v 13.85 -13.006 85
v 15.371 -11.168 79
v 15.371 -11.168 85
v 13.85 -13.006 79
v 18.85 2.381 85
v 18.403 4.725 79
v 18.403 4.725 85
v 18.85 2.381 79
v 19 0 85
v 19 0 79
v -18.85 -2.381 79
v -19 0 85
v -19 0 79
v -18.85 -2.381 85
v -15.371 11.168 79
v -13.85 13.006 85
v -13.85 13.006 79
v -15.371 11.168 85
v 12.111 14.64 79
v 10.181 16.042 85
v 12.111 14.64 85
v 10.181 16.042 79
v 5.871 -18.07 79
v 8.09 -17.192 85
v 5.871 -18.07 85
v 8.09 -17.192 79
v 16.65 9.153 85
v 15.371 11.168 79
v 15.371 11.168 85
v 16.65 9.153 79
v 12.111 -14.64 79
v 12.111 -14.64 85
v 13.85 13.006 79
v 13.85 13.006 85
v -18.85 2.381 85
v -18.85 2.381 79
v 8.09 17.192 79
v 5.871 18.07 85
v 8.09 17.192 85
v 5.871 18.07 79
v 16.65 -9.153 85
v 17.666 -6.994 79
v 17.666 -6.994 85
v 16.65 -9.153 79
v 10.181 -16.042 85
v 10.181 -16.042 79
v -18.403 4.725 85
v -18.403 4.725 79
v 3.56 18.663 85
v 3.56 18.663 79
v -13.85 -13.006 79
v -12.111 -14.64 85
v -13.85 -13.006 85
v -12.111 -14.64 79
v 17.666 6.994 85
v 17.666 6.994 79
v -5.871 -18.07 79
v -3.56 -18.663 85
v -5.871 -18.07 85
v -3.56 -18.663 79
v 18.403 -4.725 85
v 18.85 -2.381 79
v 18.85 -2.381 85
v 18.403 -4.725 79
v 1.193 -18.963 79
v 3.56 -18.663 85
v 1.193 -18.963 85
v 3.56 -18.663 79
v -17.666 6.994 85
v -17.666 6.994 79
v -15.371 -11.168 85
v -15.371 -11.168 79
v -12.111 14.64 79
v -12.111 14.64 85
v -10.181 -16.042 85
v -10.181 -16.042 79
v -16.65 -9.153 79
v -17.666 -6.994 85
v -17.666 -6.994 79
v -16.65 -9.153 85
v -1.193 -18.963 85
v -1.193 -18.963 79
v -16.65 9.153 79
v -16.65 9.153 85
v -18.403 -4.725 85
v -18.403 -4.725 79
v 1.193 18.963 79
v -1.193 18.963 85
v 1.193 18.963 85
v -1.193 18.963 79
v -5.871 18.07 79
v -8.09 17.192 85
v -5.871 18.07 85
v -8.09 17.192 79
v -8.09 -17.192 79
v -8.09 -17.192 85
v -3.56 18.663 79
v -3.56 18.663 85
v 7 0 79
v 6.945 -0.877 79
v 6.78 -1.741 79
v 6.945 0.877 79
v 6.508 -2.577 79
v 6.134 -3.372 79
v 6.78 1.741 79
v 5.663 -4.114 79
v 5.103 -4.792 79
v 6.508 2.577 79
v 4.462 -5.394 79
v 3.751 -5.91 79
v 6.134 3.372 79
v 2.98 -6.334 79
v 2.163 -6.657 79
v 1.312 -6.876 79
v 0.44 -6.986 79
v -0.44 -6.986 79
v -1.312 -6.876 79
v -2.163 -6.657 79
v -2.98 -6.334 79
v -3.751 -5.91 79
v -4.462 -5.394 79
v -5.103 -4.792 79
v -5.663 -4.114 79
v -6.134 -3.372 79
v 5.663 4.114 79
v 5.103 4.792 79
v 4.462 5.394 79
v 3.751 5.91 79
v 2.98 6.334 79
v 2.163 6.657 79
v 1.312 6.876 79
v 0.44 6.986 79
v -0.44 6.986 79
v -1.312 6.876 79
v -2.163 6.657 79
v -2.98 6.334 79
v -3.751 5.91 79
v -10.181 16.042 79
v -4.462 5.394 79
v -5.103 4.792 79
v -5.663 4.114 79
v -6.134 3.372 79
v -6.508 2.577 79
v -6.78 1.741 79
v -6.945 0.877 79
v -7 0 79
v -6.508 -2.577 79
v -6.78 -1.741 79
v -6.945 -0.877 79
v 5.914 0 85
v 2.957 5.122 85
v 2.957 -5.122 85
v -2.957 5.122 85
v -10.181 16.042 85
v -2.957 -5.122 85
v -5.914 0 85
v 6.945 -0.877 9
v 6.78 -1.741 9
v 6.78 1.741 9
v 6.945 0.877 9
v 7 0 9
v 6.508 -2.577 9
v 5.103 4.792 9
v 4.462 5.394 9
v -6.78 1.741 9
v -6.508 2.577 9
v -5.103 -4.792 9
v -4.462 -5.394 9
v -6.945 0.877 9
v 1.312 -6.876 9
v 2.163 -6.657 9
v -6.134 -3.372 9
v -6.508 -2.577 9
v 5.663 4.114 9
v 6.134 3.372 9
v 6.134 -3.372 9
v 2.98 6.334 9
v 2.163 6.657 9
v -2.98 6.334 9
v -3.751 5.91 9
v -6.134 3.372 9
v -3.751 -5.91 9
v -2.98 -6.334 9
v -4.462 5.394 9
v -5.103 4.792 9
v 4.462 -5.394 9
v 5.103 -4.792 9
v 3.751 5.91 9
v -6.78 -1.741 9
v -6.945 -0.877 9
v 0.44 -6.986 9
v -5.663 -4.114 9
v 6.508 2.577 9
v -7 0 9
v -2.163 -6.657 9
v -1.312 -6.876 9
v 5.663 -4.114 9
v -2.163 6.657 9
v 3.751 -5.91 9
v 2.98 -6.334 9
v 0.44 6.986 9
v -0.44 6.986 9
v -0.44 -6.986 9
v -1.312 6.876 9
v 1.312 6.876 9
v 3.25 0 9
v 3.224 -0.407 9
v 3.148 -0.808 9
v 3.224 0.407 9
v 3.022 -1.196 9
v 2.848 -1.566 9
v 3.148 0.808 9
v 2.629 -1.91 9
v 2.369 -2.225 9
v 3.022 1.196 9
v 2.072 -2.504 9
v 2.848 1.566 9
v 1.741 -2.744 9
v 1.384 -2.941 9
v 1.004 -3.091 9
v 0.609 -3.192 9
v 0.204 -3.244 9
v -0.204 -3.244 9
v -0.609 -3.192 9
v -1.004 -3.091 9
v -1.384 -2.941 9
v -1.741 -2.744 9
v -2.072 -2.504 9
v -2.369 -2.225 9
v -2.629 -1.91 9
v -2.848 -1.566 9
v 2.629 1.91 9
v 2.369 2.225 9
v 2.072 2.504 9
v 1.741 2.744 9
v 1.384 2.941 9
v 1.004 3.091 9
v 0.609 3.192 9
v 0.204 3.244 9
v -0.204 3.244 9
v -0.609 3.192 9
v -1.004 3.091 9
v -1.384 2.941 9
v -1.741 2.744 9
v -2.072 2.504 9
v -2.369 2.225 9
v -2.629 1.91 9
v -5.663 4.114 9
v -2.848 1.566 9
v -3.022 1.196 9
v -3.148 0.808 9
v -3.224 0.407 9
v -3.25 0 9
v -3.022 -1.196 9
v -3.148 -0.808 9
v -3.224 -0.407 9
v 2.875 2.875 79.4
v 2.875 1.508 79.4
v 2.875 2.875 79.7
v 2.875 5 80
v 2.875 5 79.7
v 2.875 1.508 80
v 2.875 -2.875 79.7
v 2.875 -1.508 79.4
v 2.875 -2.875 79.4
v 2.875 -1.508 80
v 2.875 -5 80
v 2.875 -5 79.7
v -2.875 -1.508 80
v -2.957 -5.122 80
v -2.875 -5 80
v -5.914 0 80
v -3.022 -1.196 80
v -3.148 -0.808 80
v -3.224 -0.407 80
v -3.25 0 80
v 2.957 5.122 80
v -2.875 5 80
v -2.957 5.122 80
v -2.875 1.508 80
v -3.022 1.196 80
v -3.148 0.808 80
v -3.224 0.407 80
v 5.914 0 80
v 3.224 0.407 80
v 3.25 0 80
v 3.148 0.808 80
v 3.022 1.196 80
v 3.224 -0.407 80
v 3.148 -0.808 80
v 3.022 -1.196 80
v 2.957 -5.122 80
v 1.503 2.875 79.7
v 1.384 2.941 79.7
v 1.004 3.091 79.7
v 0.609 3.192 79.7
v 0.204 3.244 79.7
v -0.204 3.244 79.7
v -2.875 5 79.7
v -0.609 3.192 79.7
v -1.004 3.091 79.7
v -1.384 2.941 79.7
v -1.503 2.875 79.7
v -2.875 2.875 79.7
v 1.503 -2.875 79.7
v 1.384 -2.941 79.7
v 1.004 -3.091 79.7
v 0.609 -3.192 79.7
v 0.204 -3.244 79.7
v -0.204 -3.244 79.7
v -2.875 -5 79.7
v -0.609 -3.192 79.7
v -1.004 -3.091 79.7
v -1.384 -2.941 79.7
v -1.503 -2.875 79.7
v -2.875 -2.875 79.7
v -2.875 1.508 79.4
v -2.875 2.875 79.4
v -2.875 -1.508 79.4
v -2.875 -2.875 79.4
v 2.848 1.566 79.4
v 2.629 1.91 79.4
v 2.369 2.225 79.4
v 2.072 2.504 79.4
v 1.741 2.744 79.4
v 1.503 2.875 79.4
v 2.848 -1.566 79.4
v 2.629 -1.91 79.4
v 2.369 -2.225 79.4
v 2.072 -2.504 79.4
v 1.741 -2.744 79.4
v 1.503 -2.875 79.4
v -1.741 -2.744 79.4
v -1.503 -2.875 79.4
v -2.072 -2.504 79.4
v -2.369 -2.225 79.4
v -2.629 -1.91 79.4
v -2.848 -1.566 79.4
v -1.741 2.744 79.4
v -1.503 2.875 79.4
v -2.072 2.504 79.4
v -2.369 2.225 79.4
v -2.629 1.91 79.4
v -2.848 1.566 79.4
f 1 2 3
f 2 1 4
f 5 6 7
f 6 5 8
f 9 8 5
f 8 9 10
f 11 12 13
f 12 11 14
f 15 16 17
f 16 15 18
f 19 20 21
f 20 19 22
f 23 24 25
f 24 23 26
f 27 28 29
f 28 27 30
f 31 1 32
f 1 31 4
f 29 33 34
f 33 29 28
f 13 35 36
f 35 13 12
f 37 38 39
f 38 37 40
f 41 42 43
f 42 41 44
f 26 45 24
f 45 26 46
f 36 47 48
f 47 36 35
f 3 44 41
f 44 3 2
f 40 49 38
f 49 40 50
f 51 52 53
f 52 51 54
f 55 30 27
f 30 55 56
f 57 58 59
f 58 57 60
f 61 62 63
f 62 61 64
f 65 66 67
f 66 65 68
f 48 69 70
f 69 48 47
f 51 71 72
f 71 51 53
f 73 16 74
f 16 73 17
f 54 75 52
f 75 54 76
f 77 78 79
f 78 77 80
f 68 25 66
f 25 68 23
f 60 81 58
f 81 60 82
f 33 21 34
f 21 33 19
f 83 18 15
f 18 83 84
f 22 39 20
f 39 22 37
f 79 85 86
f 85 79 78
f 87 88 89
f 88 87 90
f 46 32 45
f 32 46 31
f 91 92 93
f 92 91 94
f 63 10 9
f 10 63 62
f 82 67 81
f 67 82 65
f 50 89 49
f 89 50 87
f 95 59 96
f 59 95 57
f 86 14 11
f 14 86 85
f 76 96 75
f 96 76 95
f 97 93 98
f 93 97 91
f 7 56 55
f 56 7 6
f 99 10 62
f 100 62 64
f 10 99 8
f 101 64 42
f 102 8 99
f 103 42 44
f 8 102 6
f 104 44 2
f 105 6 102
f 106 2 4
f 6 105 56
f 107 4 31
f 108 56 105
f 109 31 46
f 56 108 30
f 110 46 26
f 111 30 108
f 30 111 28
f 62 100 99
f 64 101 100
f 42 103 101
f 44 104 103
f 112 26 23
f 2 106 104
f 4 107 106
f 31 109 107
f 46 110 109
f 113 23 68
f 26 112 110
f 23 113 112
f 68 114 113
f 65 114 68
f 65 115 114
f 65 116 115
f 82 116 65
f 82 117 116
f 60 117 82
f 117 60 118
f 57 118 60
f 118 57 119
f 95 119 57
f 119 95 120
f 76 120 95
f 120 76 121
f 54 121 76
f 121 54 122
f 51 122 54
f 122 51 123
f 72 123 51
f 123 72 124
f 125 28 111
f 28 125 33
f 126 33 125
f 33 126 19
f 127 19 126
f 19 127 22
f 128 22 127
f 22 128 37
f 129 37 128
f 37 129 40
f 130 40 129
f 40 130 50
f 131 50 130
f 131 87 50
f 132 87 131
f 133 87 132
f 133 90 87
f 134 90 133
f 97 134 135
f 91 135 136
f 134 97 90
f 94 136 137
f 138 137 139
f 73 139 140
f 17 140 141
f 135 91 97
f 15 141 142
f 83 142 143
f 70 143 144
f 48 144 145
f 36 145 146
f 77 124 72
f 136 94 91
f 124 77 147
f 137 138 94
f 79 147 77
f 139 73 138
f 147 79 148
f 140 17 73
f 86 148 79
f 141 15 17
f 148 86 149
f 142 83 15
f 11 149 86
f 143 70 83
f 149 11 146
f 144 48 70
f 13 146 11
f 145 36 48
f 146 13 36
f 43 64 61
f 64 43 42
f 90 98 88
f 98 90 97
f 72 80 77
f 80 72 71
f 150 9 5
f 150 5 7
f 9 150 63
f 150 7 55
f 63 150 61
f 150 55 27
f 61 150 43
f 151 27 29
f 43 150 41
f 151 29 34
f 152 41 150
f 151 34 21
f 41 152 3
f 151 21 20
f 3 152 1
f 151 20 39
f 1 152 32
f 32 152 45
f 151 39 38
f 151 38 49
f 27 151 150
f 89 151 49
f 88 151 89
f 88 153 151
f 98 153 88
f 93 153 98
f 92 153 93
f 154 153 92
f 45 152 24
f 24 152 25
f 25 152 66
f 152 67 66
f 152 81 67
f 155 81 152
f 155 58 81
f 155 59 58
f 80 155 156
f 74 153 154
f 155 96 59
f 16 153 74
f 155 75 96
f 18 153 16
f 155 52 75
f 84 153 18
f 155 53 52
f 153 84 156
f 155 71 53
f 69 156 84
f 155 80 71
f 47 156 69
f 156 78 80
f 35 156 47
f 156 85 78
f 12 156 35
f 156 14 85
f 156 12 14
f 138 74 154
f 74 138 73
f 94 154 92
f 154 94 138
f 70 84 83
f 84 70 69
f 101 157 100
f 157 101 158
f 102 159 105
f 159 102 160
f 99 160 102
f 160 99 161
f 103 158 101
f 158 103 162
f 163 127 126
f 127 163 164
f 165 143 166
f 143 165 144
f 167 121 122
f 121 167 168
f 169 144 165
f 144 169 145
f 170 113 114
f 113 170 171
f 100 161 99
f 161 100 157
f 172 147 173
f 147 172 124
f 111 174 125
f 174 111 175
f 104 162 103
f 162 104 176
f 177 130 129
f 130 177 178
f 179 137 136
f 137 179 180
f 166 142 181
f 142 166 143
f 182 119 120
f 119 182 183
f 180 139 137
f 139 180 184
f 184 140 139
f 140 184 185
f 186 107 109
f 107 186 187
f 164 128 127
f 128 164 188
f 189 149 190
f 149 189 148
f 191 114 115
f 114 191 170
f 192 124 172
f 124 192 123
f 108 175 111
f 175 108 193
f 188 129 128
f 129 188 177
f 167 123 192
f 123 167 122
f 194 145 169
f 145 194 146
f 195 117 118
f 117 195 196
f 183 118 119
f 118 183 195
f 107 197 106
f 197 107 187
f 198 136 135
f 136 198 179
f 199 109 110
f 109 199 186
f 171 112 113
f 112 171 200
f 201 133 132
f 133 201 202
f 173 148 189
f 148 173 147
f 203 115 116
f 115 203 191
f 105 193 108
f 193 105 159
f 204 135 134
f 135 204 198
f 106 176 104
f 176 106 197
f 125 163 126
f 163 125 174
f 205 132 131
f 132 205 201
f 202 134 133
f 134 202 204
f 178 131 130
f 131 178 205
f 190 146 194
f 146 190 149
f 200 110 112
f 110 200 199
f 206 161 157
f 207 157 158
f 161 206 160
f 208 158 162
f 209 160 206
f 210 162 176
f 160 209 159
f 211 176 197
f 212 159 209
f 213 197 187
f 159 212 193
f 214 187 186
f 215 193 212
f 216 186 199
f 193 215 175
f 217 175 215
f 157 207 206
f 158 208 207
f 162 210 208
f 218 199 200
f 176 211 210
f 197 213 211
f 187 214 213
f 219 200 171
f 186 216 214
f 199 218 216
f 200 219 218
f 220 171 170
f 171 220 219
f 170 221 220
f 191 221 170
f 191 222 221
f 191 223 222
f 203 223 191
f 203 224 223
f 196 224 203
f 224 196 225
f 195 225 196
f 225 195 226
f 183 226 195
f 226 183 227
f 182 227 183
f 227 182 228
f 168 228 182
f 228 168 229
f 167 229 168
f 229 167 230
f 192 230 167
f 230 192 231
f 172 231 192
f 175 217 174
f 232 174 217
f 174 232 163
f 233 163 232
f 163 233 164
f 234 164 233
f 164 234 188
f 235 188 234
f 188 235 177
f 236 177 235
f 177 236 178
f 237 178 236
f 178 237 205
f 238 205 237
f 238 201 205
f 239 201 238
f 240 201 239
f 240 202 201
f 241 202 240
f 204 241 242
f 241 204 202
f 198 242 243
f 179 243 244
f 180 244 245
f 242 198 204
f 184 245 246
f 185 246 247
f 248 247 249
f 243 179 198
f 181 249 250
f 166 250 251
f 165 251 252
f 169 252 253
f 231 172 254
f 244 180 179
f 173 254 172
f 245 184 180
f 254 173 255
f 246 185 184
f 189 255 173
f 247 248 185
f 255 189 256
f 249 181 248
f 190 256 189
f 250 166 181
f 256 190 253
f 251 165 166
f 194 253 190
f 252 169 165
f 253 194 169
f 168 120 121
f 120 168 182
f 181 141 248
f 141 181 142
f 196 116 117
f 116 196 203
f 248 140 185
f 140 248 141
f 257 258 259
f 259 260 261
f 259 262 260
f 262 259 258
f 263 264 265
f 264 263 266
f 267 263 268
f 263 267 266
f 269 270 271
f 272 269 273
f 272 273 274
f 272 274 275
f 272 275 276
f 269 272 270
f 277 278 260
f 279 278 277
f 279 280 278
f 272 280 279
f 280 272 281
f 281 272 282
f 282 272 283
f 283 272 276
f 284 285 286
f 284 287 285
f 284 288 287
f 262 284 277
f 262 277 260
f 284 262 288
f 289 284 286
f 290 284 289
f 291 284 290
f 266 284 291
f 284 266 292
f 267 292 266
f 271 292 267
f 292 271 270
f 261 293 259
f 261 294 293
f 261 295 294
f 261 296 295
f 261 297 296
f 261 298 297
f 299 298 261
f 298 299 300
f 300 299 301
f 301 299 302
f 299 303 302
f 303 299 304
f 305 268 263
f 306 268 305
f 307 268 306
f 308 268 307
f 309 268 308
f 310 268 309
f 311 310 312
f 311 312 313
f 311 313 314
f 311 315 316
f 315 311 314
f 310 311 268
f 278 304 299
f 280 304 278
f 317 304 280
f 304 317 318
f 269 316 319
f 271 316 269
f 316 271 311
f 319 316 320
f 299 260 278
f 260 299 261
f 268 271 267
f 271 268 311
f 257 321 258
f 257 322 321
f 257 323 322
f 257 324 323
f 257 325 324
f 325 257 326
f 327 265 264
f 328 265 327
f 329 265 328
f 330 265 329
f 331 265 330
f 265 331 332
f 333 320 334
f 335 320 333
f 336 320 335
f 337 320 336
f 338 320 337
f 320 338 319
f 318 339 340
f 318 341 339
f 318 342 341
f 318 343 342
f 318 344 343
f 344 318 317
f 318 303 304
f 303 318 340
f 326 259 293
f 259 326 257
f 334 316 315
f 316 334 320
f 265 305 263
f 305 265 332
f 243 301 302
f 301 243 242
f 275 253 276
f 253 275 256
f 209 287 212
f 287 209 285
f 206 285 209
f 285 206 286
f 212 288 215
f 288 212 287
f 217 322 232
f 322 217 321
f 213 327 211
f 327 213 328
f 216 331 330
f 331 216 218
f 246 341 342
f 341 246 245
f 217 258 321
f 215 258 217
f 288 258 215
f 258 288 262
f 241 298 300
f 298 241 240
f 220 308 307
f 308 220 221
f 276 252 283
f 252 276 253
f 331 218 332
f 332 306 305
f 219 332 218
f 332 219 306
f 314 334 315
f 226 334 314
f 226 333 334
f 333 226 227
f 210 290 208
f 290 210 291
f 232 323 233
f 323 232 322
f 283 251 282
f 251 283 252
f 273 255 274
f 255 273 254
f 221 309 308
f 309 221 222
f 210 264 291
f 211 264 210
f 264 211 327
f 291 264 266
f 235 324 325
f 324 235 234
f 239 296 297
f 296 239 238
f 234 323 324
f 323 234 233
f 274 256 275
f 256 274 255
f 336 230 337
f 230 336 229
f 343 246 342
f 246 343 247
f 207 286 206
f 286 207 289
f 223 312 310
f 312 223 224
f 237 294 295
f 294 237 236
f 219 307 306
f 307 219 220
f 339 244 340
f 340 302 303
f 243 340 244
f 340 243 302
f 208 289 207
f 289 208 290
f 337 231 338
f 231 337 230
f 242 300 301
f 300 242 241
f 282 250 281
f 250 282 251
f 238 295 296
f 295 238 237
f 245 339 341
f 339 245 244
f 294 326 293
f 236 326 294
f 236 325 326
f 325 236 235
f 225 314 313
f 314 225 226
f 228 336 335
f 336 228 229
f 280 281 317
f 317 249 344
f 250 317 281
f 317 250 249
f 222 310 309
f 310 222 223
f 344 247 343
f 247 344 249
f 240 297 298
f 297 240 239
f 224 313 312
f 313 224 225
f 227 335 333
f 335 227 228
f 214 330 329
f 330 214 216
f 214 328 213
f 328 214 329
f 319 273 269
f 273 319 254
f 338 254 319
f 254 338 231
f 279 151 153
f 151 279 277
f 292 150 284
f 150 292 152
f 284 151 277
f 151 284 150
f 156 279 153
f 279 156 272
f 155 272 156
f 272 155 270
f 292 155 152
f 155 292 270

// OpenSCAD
$fn = 50;


difference() {
	union() {
		translate(v = [0, 0, 79.0000000000]) {
			cylinder(h = 6, r = 19.0000000000);
		}
		translate(v = [0, 0, 9.0000000000]) {
			cylinder(h = 76, r = 7.0000000000);
		}
	}
	union() {
		translate(v = [0, 0, 85]) {
			rotate(a = [0, 0, 0]) {
				difference() {
					union() {
						#translate(v = [-2.8750000000, -5.0000000000, -5.3000000000]) {
							cube(size = [5.7500000000, 10, 0.3000000000]);
						}
						#translate(v = [-2.8750000000, -2.8750000000, -5.6000000000]) {
							cube(size = [5.7500000000, 5.7500000000, 0.3000000000]);
						}
						#translate(v = [-2.8750000000, -5.0000000000, 0]) {
							cube(size = [5.7500000000, 10, 0.3000000000]);
						}
						#translate(v = [-2.8750000000, -2.8750000000, 0.3000000000]) {
							cube(size = [5.7500000000, 5.7500000000, 0.3000000000]);
						}
						#translate(v = [0, 0, -100.0000000000]) {
							cylinder(h = 200, r = 3.2500000000);
						}
						translate(v = [0, 0, -5]) {
							#linear_extrude(height = 5) {
								polygon(points = [[5.9142500000, 0.0000000000], [2.9571250000, 5.1218907443], [-2.9571250000, 5.1218907443], [-5.9142500000, 0.0000000000], [-2.9571250000, -5.1218907443], [2.9571250000, -5.1218907443]]);
							}
						}
						#translate(v = [-2.8750000000, -5.0000000000, -5.3000000000]) {
							cube(size = [5.7500000000, 10, 0.3000000000]);
						}
						#translate(v = [-2.8750000000, -2.8750000000, -5.6000000000]) {
							cube(size = [5.7500000000, 5.7500000000, 0.3000000000]);
						}
						#translate(v = [-2.8750000000, -5.0000000000, 0]) {
							cube(size = [5.7500000000, 10, 0.3000000000]);
						}
						#translate(v = [-2.8750000000, -2.8750000000, 0.3000000000]) {
							cube(size = [5.7500000000, 5.7500000000, 0.3000000000]);
						}
						#translate(v = [0, 0, -100.0000000000]) {
							cylinder(h = 200, r = 3.2500000000);
						}
						#translate(v = [-2.8750000000, -5.0000000000, -5.3000000000]) {
							cube(size = [5.7500000000, 10, 0.3000000000]);
						}
						#translate(v = [-2.8750000000, -2.8750000000, -5.6000000000]) {
							cube(size = [5.7500000000, 5.7500000000, 0.3000000000]);
						}
						#translate(v = [-2.8750000000, -5.0000000000, 0]) {
							cube(size = [5.7500000000, 10, 0.3000000000]);
						}
						#translate(v = [-2.8750000000, -2.8750000000, 0.3000000000]) {
							cube(size = [5.7500000000, 5.7500000000, 0.3000000000]);
						}
						#translate(v = [0, 0, -100.0000000000]) {
							cylinder(h = 200, r = 3.2500000000);
						}
					}
					union();
				}
			}
		}
		#translate(v = [0, 0, -100.0000000000]) {
			cylinder(h = 200, r = 3.2500000000);
		}
	}
}
